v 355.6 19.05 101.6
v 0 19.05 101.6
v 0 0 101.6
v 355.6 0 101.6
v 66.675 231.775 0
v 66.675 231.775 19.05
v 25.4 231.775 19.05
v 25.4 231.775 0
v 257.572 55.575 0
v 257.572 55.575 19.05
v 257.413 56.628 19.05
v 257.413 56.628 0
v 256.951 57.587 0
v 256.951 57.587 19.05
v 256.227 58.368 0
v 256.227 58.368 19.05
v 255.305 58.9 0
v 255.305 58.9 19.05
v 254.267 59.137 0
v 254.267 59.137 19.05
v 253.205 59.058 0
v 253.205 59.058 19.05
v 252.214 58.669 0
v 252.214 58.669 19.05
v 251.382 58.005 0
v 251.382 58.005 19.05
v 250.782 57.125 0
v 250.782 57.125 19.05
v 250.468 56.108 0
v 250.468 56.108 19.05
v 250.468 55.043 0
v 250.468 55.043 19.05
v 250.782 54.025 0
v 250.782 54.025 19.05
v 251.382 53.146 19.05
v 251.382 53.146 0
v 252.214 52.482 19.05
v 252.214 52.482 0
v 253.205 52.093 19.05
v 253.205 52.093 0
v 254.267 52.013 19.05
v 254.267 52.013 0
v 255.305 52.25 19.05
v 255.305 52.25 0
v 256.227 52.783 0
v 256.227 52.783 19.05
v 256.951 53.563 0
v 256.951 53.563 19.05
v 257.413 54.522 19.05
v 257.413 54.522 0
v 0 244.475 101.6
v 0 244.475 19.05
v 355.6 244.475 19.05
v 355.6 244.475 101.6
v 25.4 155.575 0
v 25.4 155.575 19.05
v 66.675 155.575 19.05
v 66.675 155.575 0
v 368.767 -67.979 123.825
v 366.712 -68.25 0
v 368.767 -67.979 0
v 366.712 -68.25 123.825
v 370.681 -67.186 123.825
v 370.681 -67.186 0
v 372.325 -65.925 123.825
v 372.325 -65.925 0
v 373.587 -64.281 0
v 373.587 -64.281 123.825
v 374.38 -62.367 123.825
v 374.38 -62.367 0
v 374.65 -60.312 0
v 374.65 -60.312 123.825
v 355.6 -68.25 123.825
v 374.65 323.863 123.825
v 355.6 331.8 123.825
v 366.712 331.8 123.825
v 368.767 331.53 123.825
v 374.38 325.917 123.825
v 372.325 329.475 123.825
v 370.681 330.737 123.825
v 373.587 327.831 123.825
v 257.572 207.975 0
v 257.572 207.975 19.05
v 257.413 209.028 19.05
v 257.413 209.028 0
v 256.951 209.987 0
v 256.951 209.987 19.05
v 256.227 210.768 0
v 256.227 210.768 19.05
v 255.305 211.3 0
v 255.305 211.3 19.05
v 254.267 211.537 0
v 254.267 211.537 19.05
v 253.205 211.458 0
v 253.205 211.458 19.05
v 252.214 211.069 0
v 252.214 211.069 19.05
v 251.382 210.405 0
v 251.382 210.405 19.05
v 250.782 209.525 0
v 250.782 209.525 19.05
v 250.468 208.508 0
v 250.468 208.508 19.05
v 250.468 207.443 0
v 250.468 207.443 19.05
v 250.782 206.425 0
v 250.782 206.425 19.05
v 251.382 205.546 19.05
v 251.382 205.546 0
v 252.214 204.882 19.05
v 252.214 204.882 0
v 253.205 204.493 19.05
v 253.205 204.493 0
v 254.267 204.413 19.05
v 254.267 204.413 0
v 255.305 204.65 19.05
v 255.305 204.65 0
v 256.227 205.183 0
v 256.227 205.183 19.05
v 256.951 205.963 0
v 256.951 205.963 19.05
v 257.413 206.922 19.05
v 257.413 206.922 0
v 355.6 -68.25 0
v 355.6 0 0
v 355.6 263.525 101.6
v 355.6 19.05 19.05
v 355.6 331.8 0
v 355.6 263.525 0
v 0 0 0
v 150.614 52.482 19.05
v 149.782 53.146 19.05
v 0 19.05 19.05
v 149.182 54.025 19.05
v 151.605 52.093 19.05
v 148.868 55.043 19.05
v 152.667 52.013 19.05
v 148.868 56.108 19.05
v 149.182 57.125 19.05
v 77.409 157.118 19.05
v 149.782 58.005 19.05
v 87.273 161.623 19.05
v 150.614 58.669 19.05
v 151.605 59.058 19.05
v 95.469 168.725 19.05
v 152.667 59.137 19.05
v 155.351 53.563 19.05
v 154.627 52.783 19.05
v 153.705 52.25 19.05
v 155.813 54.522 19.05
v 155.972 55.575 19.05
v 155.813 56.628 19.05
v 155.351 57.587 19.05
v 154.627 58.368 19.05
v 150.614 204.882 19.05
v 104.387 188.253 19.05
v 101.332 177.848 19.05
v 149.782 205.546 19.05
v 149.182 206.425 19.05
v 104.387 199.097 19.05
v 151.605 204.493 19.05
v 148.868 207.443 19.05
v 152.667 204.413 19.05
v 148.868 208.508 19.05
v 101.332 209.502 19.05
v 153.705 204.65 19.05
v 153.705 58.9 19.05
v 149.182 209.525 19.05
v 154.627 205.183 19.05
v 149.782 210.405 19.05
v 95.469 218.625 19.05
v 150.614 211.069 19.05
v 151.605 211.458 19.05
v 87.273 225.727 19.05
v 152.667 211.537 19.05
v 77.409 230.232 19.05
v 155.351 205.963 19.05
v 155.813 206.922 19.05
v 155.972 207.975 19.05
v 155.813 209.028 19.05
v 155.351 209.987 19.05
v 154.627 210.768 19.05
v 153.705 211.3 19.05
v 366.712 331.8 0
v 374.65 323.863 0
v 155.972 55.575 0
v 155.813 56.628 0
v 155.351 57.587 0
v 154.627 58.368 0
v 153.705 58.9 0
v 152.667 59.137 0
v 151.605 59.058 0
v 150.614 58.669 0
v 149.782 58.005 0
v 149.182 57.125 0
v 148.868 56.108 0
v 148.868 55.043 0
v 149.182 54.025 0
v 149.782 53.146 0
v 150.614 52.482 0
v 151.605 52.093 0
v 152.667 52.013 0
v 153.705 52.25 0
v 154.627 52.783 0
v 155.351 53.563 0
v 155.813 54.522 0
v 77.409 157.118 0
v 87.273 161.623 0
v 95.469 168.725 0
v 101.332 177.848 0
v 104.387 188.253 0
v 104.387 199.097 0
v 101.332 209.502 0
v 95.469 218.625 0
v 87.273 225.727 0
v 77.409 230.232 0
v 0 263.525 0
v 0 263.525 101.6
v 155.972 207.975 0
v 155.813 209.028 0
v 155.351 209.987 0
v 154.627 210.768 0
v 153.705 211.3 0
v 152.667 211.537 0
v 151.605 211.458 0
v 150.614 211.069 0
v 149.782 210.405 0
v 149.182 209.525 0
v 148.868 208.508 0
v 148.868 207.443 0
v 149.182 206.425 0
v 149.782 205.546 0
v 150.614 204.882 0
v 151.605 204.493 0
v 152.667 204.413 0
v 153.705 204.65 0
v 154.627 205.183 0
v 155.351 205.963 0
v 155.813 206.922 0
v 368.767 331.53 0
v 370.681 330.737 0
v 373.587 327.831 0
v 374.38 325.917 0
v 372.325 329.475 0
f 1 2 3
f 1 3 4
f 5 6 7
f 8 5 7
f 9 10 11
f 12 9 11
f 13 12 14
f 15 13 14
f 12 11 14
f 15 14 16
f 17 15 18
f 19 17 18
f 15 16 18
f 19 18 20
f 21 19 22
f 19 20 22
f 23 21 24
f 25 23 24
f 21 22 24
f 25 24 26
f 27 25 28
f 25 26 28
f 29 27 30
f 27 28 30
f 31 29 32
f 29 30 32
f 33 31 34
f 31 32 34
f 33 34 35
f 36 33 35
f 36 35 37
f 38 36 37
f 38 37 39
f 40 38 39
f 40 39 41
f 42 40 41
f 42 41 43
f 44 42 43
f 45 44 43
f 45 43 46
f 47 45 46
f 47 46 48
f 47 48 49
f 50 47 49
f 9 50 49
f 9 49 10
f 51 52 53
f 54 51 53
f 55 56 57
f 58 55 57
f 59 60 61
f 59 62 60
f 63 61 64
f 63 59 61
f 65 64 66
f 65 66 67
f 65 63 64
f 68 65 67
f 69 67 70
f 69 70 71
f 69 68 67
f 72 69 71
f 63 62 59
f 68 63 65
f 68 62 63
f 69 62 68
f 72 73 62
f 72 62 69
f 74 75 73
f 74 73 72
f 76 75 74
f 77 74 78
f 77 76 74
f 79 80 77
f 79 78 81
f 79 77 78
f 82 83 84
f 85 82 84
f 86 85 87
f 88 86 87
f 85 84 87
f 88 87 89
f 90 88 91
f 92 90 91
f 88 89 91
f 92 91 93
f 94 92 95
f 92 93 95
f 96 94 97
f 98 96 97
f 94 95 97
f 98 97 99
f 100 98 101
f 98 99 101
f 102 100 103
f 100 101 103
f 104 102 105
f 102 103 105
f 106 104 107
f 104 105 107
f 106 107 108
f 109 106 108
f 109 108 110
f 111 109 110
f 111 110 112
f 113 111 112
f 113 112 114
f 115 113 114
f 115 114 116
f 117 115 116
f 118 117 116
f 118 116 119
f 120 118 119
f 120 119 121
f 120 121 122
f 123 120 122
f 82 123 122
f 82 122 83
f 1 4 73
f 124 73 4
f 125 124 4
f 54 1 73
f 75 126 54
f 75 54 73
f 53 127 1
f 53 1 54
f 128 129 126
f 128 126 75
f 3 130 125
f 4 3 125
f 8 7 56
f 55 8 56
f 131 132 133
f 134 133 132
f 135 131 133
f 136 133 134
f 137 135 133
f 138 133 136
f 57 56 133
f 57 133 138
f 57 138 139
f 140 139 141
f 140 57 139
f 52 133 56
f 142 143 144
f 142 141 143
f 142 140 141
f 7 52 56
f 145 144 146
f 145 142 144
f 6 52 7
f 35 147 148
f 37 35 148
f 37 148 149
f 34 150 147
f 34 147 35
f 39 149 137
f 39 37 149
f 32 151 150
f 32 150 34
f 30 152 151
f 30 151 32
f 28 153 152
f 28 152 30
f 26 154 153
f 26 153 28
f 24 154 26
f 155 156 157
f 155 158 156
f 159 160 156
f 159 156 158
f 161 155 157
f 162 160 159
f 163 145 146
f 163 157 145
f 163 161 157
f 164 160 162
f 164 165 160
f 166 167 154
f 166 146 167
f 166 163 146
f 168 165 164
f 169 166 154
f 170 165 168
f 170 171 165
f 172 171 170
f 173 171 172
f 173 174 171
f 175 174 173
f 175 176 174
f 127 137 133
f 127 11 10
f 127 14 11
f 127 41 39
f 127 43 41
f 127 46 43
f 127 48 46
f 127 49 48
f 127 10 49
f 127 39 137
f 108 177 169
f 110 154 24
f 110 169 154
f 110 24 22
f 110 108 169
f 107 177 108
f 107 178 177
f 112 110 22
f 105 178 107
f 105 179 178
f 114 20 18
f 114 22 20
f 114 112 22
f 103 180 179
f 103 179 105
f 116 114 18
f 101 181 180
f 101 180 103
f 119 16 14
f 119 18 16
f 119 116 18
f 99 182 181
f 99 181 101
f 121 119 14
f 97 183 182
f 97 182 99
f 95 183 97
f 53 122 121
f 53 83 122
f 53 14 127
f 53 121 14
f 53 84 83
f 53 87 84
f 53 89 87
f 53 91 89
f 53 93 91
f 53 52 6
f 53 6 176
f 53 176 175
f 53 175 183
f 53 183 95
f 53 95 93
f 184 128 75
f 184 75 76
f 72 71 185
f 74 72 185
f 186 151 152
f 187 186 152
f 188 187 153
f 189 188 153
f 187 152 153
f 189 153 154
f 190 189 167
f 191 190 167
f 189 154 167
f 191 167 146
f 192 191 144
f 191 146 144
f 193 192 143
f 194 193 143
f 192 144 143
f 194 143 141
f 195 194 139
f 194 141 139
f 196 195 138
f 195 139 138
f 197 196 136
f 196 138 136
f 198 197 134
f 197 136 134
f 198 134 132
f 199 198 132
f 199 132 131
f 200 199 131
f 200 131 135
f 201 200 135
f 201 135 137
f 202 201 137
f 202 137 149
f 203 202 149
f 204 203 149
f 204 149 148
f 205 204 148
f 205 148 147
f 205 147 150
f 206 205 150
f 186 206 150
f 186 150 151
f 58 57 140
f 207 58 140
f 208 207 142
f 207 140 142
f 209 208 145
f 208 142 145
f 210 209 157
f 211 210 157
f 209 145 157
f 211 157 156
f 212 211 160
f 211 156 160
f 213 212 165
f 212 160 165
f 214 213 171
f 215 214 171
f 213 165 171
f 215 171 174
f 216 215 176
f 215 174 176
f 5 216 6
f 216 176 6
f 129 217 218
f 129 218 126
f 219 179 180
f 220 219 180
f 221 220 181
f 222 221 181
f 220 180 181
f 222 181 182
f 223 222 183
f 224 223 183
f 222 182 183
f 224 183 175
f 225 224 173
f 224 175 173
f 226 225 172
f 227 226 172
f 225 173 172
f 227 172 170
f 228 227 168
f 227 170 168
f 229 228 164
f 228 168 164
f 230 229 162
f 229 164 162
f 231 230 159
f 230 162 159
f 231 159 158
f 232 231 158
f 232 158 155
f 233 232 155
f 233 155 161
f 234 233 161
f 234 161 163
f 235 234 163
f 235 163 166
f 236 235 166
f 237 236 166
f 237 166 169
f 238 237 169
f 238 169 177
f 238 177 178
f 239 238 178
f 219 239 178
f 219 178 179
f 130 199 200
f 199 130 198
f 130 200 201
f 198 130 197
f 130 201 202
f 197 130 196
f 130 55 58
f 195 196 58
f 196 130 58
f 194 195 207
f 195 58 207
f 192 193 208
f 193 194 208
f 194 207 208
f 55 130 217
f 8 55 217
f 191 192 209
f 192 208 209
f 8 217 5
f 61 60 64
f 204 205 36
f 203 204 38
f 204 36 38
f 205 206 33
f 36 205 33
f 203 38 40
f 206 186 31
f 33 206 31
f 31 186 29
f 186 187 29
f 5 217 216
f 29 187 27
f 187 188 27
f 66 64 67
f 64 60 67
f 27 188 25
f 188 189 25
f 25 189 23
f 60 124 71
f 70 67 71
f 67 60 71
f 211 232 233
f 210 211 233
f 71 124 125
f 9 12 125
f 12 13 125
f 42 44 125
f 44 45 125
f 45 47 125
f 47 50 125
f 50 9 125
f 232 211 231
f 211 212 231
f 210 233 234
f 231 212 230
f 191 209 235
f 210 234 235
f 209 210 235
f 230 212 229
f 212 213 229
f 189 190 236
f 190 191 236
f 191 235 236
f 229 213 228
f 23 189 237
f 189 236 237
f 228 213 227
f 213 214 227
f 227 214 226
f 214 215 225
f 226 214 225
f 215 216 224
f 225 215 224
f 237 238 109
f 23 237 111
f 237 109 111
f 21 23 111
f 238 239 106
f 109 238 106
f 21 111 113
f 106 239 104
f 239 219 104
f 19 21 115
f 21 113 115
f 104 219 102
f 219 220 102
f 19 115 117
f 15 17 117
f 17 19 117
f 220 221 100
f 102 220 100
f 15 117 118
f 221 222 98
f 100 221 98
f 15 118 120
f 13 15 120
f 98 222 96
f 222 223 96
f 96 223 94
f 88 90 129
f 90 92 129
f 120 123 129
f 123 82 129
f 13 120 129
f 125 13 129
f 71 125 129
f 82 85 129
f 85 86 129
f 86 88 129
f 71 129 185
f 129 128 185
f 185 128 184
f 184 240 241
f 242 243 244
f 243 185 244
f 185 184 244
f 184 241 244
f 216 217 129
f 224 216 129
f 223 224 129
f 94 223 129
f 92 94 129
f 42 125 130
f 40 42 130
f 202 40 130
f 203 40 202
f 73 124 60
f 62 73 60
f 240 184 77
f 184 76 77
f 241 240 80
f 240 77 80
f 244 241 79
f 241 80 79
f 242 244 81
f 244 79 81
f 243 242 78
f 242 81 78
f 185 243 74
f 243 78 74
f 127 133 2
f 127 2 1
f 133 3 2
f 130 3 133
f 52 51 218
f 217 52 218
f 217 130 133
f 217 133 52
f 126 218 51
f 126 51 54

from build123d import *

# Parameters (mm, degrees)
F0_W      = 355.6
F0_H      = 263.525
F1_DEPTH  = 19.05
F2_W      = 355.6
F2_H      = 19.05
F3_DEPTH  = 82.55
F4_W      = 19.05
F4_H      = 400.05
F5_DEPTH  = 123.825
F6_R      = 7.9375
F8_DEPTH  = 25.4
F9_R      = 3.571875
F10_DEPTH = 25.4


with BuildPart() as f1:
    # F0 (on Top) → F1 (new body)
    with BuildSketch(Plane.XY):
        with Locations((177.8, 131.7625)):
            Rectangle(F0_W, F0_H)
    extrude(amount=F1_DEPTH)

    # F2 (on face) → F3 (join)
    with BuildSketch(Plane.XY.offset(19.05)):
        with Locations((177.8, 254)):
            Rectangle(F2_W, F2_H)
        with Locations((177.8, 9.525)):
            Rectangle(F2_W, F2_H)
    extrude(amount=F3_DEPTH)

    # F4 (on Top) → F5 (join)
    with BuildSketch(Plane.XY):
        with Locations((365.125, 131.7752)):
            Rectangle(F4_W, F4_H)
    extrude(amount=F5_DEPTH)

    # F6
    f6_edges = [f1.edges().sort_by_distance(p)[0] for p in [
        (374.65, 331.8002, 61.9125),
        (374.65, -68.2498, 61.9125),
    ]]
    fillet(f6_edges, radius=F6_R)

    # F7 (on face) → F8 (cut)
    with BuildSketch(Plane.XY.offset(19.05)):
        with BuildLine():
            Line((66.675, 231.775), (25.4, 231.775))
            Line((25.4, 231.775), (25.4, 155.575))
            Line((25.4, 155.575), (66.675, 155.575))
            ThreePointArc((66.675, 155.575), (104.775, 193.675), (66.675, 231.775))
        make_face()
    extrude(amount=-F8_DEPTH, mode=Mode.SUBTRACT)

    # F9 (on face) → F10 (cut)
    with BuildSketch(Plane.XY.offset(19.05)):
        with Locations((152.4, 207.9752)):
            Circle(F9_R)
        with Locations((152.4, 55.5752)):
            Circle(F9_R)
        with Locations((254, 207.9752)):
            Circle(F9_R)
        with Locations((254, 55.5752)):
            Circle(F9_R)
    extrude(amount=-F10_DEPTH, mode=Mode.SUBTRACT)


solid = f1.part
